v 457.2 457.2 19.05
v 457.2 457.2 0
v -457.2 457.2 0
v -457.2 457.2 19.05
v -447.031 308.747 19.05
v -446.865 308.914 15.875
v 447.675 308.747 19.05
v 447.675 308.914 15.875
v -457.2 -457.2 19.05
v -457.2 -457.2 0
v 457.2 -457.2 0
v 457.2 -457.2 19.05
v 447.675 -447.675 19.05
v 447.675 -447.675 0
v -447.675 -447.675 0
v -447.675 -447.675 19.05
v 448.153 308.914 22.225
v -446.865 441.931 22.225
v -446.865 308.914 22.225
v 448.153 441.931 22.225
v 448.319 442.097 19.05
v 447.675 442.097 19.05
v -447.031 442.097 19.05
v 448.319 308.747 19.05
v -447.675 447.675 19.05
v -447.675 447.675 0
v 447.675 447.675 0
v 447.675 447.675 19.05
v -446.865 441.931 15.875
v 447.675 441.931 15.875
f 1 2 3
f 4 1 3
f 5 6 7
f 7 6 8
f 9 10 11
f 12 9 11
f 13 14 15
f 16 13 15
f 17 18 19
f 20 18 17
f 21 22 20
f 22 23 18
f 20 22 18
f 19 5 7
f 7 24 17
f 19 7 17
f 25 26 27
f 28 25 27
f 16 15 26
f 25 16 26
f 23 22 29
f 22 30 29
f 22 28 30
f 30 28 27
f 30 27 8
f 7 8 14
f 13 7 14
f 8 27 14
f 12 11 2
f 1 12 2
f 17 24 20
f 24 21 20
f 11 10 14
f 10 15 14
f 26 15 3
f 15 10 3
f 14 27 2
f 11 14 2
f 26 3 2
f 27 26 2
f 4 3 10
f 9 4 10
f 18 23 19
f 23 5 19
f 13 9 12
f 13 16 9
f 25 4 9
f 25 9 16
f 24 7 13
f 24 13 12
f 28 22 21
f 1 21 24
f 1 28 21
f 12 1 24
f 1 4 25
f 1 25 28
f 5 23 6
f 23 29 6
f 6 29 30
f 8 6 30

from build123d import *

# Parameters (mm, degrees)
F1_DEPTH  = 19.05
F2_W      = 895.35
F2_H      = 19.05
F5_DEPTH  = 19.05
F6_DEPTH  = 38.1
F3_W      = 895.35
F3_H      = 19.05
F7_DEPTH  = 19.05
F4_W      = 895.35
F4_H      = 19.05
F8_DEPTH  = 127
F10_W     = 895.35
F10_H     = 19.05
F11_DEPTH = 19.05
F12_W     = 895.35
F12_H     = 133.35
F13_DEPTH = 3.175
F13_TAPER = 3


# Not quite as in the source:
# - the program builds the solid bodies; features that only make, move or delete a surface that nothing else refers to are left out


with BuildPart() as f1:
    # F0 (on Top) → F1 (new body)
    with BuildSketch(Plane.XY):
        Polygon((457.2, -457.2), (457.2, 457.2), (186.2517595291, 457.2), (-457.2, 457.2), (-457.2, -457.2), align=None)
        Polygon((-447.675, 447.675), (186.2517595291, 447.675), (447.675, 447.675), (447.675, -447.675), (-447.675, -447.675), align=None, mode=Mode.SUBTRACT)
    extrude(amount=F1_DEPTH)

    # F3 (on face) → F7 (cut)
    with BuildSketch(Plane.XY.offset(19.05)):
        with Locations((0, 298.0556269322)):
            Rectangle(F3_W, F3_H)
    extrude(amount=-F7_DEPTH, mode=Mode.SUBTRACT)

    # F4 (on face) → F8 (cut)
    with BuildSketch(Plane.XY.offset(19.05)):
        with Locations((0, 298.0556269322)):
            Rectangle(F4_W, F4_H)
    extrude(amount=-F8_DEPTH, mode=Mode.SUBTRACT)

    # F10 (on face) → F11 (cut)
    with BuildSketch(Plane.XY.offset(19.05)):
        with Locations((0, 298.0556269322)):
            Rectangle(F10_W, F10_H)
    extrude(amount=-F11_DEPTH, mode=Mode.SUBTRACT)

    # F12 (on face) → F13 (join, symmetric)
    with BuildSketch(Plane.XY.offset(19.05)):
        with Locations((0.6440271378, 375.4221406161)):
            Rectangle(F12_W, F12_H)
    extrude(amount=F13_DEPTH, both=True, taper=F13_TAPER)


with BuildPart() as f5:
    # F2 (on face) → F5 (new body)
    with BuildSketch(Plane.XY.offset(19.05)):
        with Locations((0, 298.0556269322)):
            Rectangle(F2_W, F2_H)
    extrude(amount=F5_DEPTH)

    # F6 (cut): a face of the model
    f6_faces = [f5.faces().sort_by_distance(p)[0] for p in [
        (0, 298.0556269322, 38.1),
    ]]
    extrude(f6_faces, amount=-F6_DEPTH, mode=Mode.SUBTRACT)


solid = f1.part
